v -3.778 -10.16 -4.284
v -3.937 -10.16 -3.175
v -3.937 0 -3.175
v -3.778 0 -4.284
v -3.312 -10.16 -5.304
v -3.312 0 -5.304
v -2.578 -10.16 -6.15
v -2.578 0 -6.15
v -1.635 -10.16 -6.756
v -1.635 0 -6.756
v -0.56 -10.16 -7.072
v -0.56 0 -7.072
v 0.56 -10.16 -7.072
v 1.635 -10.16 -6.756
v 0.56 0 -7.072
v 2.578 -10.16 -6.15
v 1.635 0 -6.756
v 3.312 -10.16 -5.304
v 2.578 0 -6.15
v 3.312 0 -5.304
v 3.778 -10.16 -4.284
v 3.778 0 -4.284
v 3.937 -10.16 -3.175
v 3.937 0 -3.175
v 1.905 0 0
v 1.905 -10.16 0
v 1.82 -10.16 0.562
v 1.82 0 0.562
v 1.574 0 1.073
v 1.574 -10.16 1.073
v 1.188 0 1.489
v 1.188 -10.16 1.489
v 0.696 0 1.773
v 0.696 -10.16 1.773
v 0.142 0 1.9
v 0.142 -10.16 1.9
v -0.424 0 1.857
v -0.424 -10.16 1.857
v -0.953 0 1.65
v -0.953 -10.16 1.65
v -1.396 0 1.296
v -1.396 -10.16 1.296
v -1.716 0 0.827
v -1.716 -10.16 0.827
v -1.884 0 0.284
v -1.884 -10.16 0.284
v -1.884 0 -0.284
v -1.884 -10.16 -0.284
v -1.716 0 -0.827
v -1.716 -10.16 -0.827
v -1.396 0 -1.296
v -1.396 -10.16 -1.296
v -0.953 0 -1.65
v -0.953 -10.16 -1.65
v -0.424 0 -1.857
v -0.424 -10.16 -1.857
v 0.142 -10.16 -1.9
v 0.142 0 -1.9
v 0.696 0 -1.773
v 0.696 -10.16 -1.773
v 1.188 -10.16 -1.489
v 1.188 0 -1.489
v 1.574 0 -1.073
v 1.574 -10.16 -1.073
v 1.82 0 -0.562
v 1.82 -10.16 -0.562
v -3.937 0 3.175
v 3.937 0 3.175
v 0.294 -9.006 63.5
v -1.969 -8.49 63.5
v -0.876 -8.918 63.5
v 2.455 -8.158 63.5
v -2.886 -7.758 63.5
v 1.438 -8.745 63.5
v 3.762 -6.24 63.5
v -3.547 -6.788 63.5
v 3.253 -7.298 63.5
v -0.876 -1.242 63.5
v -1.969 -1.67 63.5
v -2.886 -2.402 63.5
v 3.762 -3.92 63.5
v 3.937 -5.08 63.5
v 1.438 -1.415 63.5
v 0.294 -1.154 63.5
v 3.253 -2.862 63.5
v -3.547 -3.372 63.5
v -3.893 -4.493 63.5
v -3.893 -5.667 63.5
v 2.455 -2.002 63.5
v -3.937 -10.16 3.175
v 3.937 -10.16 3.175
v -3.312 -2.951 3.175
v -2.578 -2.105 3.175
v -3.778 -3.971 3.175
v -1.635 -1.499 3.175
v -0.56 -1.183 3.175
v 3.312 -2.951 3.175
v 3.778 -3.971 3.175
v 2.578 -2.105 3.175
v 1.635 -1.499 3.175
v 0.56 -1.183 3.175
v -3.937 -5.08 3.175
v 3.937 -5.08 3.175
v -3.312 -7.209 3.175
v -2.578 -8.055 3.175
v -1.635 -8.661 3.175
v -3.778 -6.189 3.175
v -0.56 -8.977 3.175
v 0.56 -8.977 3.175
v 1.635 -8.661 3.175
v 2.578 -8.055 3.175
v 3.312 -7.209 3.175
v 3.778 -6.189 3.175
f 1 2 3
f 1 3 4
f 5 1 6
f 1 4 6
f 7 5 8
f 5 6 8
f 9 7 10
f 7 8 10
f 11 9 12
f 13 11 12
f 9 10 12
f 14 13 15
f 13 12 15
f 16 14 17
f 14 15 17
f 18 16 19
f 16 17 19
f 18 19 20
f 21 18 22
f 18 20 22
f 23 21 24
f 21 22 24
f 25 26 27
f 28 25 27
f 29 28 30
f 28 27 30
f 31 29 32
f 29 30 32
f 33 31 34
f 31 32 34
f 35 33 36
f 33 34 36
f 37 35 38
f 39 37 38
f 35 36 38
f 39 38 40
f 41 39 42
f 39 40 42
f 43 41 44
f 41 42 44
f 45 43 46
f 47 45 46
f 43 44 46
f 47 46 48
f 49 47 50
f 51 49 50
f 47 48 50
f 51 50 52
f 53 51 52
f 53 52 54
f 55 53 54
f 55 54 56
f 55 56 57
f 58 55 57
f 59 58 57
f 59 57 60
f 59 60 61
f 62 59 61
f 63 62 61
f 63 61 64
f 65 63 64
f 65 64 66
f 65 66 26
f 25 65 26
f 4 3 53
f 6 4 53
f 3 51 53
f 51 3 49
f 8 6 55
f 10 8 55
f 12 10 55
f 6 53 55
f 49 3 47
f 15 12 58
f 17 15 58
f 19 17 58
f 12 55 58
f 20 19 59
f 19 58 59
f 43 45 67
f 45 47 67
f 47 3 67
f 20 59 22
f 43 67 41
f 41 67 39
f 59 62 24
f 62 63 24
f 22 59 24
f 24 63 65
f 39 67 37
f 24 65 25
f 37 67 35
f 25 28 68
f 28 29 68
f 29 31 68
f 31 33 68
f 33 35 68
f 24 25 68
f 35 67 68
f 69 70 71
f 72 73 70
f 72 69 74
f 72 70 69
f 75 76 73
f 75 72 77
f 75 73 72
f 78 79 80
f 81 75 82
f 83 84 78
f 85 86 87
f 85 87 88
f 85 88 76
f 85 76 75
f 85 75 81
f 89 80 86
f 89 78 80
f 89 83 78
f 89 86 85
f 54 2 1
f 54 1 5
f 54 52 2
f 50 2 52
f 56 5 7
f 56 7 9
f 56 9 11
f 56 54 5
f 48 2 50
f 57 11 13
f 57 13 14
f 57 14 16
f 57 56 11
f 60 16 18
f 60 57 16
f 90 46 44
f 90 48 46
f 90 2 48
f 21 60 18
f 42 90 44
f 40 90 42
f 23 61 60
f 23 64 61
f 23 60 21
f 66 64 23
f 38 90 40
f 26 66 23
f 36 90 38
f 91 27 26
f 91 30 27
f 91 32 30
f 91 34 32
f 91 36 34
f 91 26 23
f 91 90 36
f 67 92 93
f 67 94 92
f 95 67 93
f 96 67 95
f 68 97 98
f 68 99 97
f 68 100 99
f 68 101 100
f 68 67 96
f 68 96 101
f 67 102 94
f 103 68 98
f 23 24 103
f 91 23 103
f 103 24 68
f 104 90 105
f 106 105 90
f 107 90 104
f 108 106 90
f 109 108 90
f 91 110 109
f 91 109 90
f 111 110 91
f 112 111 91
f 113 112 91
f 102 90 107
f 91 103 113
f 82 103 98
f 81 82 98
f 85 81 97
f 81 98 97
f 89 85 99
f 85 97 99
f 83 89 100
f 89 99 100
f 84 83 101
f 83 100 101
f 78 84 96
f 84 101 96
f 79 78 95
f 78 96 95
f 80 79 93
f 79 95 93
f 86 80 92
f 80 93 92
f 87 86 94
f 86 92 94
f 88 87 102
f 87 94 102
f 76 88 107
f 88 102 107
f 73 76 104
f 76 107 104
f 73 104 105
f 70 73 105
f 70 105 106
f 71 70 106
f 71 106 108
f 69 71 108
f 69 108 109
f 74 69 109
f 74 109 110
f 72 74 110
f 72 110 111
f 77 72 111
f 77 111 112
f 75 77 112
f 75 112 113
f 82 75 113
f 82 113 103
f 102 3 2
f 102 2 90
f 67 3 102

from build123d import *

# Parameters (mm, degrees)
F0_W     = 7.874
F0_H     = 6.35
F1_DEPTH = 10.16
F2_R     = 1.905
F3_DEPTH = 10.161
F5_DEPTH = 60.325


with BuildPart() as f1:
    # F0 (on Front) → F1 (new body)
    with BuildSketch(Plane.XZ):
        Rectangle(F0_W, F0_H)
        with BuildLine():
            Line((3.937, -3.175), (-3.937, -3.175))
            ThreePointArc((-3.937, -3.175), (0, -7.112), (3.937, -3.175))
        make_face()
    extrude(amount=F1_DEPTH)

    # F2 (on face) → F3 (cut, through all)
    with BuildSketch(Plane.XZ.offset(10.16)):
        Circle(F2_R)
    extrude(amount=-F3_DEPTH, mode=Mode.SUBTRACT)

    # F4 (on face) → F5 (join)
    with BuildSketch(Plane.XY.offset(3.175)):
        with BuildLine():
            ThreePointArc((-3.937, -5.08), (0, -9.017), (3.937, -5.08))
            ThreePointArc((3.937, -5.08), (0, -1.143), (-3.937, -5.08))
        make_face()
    extrude(amount=F5_DEPTH)


solid = f1.part
